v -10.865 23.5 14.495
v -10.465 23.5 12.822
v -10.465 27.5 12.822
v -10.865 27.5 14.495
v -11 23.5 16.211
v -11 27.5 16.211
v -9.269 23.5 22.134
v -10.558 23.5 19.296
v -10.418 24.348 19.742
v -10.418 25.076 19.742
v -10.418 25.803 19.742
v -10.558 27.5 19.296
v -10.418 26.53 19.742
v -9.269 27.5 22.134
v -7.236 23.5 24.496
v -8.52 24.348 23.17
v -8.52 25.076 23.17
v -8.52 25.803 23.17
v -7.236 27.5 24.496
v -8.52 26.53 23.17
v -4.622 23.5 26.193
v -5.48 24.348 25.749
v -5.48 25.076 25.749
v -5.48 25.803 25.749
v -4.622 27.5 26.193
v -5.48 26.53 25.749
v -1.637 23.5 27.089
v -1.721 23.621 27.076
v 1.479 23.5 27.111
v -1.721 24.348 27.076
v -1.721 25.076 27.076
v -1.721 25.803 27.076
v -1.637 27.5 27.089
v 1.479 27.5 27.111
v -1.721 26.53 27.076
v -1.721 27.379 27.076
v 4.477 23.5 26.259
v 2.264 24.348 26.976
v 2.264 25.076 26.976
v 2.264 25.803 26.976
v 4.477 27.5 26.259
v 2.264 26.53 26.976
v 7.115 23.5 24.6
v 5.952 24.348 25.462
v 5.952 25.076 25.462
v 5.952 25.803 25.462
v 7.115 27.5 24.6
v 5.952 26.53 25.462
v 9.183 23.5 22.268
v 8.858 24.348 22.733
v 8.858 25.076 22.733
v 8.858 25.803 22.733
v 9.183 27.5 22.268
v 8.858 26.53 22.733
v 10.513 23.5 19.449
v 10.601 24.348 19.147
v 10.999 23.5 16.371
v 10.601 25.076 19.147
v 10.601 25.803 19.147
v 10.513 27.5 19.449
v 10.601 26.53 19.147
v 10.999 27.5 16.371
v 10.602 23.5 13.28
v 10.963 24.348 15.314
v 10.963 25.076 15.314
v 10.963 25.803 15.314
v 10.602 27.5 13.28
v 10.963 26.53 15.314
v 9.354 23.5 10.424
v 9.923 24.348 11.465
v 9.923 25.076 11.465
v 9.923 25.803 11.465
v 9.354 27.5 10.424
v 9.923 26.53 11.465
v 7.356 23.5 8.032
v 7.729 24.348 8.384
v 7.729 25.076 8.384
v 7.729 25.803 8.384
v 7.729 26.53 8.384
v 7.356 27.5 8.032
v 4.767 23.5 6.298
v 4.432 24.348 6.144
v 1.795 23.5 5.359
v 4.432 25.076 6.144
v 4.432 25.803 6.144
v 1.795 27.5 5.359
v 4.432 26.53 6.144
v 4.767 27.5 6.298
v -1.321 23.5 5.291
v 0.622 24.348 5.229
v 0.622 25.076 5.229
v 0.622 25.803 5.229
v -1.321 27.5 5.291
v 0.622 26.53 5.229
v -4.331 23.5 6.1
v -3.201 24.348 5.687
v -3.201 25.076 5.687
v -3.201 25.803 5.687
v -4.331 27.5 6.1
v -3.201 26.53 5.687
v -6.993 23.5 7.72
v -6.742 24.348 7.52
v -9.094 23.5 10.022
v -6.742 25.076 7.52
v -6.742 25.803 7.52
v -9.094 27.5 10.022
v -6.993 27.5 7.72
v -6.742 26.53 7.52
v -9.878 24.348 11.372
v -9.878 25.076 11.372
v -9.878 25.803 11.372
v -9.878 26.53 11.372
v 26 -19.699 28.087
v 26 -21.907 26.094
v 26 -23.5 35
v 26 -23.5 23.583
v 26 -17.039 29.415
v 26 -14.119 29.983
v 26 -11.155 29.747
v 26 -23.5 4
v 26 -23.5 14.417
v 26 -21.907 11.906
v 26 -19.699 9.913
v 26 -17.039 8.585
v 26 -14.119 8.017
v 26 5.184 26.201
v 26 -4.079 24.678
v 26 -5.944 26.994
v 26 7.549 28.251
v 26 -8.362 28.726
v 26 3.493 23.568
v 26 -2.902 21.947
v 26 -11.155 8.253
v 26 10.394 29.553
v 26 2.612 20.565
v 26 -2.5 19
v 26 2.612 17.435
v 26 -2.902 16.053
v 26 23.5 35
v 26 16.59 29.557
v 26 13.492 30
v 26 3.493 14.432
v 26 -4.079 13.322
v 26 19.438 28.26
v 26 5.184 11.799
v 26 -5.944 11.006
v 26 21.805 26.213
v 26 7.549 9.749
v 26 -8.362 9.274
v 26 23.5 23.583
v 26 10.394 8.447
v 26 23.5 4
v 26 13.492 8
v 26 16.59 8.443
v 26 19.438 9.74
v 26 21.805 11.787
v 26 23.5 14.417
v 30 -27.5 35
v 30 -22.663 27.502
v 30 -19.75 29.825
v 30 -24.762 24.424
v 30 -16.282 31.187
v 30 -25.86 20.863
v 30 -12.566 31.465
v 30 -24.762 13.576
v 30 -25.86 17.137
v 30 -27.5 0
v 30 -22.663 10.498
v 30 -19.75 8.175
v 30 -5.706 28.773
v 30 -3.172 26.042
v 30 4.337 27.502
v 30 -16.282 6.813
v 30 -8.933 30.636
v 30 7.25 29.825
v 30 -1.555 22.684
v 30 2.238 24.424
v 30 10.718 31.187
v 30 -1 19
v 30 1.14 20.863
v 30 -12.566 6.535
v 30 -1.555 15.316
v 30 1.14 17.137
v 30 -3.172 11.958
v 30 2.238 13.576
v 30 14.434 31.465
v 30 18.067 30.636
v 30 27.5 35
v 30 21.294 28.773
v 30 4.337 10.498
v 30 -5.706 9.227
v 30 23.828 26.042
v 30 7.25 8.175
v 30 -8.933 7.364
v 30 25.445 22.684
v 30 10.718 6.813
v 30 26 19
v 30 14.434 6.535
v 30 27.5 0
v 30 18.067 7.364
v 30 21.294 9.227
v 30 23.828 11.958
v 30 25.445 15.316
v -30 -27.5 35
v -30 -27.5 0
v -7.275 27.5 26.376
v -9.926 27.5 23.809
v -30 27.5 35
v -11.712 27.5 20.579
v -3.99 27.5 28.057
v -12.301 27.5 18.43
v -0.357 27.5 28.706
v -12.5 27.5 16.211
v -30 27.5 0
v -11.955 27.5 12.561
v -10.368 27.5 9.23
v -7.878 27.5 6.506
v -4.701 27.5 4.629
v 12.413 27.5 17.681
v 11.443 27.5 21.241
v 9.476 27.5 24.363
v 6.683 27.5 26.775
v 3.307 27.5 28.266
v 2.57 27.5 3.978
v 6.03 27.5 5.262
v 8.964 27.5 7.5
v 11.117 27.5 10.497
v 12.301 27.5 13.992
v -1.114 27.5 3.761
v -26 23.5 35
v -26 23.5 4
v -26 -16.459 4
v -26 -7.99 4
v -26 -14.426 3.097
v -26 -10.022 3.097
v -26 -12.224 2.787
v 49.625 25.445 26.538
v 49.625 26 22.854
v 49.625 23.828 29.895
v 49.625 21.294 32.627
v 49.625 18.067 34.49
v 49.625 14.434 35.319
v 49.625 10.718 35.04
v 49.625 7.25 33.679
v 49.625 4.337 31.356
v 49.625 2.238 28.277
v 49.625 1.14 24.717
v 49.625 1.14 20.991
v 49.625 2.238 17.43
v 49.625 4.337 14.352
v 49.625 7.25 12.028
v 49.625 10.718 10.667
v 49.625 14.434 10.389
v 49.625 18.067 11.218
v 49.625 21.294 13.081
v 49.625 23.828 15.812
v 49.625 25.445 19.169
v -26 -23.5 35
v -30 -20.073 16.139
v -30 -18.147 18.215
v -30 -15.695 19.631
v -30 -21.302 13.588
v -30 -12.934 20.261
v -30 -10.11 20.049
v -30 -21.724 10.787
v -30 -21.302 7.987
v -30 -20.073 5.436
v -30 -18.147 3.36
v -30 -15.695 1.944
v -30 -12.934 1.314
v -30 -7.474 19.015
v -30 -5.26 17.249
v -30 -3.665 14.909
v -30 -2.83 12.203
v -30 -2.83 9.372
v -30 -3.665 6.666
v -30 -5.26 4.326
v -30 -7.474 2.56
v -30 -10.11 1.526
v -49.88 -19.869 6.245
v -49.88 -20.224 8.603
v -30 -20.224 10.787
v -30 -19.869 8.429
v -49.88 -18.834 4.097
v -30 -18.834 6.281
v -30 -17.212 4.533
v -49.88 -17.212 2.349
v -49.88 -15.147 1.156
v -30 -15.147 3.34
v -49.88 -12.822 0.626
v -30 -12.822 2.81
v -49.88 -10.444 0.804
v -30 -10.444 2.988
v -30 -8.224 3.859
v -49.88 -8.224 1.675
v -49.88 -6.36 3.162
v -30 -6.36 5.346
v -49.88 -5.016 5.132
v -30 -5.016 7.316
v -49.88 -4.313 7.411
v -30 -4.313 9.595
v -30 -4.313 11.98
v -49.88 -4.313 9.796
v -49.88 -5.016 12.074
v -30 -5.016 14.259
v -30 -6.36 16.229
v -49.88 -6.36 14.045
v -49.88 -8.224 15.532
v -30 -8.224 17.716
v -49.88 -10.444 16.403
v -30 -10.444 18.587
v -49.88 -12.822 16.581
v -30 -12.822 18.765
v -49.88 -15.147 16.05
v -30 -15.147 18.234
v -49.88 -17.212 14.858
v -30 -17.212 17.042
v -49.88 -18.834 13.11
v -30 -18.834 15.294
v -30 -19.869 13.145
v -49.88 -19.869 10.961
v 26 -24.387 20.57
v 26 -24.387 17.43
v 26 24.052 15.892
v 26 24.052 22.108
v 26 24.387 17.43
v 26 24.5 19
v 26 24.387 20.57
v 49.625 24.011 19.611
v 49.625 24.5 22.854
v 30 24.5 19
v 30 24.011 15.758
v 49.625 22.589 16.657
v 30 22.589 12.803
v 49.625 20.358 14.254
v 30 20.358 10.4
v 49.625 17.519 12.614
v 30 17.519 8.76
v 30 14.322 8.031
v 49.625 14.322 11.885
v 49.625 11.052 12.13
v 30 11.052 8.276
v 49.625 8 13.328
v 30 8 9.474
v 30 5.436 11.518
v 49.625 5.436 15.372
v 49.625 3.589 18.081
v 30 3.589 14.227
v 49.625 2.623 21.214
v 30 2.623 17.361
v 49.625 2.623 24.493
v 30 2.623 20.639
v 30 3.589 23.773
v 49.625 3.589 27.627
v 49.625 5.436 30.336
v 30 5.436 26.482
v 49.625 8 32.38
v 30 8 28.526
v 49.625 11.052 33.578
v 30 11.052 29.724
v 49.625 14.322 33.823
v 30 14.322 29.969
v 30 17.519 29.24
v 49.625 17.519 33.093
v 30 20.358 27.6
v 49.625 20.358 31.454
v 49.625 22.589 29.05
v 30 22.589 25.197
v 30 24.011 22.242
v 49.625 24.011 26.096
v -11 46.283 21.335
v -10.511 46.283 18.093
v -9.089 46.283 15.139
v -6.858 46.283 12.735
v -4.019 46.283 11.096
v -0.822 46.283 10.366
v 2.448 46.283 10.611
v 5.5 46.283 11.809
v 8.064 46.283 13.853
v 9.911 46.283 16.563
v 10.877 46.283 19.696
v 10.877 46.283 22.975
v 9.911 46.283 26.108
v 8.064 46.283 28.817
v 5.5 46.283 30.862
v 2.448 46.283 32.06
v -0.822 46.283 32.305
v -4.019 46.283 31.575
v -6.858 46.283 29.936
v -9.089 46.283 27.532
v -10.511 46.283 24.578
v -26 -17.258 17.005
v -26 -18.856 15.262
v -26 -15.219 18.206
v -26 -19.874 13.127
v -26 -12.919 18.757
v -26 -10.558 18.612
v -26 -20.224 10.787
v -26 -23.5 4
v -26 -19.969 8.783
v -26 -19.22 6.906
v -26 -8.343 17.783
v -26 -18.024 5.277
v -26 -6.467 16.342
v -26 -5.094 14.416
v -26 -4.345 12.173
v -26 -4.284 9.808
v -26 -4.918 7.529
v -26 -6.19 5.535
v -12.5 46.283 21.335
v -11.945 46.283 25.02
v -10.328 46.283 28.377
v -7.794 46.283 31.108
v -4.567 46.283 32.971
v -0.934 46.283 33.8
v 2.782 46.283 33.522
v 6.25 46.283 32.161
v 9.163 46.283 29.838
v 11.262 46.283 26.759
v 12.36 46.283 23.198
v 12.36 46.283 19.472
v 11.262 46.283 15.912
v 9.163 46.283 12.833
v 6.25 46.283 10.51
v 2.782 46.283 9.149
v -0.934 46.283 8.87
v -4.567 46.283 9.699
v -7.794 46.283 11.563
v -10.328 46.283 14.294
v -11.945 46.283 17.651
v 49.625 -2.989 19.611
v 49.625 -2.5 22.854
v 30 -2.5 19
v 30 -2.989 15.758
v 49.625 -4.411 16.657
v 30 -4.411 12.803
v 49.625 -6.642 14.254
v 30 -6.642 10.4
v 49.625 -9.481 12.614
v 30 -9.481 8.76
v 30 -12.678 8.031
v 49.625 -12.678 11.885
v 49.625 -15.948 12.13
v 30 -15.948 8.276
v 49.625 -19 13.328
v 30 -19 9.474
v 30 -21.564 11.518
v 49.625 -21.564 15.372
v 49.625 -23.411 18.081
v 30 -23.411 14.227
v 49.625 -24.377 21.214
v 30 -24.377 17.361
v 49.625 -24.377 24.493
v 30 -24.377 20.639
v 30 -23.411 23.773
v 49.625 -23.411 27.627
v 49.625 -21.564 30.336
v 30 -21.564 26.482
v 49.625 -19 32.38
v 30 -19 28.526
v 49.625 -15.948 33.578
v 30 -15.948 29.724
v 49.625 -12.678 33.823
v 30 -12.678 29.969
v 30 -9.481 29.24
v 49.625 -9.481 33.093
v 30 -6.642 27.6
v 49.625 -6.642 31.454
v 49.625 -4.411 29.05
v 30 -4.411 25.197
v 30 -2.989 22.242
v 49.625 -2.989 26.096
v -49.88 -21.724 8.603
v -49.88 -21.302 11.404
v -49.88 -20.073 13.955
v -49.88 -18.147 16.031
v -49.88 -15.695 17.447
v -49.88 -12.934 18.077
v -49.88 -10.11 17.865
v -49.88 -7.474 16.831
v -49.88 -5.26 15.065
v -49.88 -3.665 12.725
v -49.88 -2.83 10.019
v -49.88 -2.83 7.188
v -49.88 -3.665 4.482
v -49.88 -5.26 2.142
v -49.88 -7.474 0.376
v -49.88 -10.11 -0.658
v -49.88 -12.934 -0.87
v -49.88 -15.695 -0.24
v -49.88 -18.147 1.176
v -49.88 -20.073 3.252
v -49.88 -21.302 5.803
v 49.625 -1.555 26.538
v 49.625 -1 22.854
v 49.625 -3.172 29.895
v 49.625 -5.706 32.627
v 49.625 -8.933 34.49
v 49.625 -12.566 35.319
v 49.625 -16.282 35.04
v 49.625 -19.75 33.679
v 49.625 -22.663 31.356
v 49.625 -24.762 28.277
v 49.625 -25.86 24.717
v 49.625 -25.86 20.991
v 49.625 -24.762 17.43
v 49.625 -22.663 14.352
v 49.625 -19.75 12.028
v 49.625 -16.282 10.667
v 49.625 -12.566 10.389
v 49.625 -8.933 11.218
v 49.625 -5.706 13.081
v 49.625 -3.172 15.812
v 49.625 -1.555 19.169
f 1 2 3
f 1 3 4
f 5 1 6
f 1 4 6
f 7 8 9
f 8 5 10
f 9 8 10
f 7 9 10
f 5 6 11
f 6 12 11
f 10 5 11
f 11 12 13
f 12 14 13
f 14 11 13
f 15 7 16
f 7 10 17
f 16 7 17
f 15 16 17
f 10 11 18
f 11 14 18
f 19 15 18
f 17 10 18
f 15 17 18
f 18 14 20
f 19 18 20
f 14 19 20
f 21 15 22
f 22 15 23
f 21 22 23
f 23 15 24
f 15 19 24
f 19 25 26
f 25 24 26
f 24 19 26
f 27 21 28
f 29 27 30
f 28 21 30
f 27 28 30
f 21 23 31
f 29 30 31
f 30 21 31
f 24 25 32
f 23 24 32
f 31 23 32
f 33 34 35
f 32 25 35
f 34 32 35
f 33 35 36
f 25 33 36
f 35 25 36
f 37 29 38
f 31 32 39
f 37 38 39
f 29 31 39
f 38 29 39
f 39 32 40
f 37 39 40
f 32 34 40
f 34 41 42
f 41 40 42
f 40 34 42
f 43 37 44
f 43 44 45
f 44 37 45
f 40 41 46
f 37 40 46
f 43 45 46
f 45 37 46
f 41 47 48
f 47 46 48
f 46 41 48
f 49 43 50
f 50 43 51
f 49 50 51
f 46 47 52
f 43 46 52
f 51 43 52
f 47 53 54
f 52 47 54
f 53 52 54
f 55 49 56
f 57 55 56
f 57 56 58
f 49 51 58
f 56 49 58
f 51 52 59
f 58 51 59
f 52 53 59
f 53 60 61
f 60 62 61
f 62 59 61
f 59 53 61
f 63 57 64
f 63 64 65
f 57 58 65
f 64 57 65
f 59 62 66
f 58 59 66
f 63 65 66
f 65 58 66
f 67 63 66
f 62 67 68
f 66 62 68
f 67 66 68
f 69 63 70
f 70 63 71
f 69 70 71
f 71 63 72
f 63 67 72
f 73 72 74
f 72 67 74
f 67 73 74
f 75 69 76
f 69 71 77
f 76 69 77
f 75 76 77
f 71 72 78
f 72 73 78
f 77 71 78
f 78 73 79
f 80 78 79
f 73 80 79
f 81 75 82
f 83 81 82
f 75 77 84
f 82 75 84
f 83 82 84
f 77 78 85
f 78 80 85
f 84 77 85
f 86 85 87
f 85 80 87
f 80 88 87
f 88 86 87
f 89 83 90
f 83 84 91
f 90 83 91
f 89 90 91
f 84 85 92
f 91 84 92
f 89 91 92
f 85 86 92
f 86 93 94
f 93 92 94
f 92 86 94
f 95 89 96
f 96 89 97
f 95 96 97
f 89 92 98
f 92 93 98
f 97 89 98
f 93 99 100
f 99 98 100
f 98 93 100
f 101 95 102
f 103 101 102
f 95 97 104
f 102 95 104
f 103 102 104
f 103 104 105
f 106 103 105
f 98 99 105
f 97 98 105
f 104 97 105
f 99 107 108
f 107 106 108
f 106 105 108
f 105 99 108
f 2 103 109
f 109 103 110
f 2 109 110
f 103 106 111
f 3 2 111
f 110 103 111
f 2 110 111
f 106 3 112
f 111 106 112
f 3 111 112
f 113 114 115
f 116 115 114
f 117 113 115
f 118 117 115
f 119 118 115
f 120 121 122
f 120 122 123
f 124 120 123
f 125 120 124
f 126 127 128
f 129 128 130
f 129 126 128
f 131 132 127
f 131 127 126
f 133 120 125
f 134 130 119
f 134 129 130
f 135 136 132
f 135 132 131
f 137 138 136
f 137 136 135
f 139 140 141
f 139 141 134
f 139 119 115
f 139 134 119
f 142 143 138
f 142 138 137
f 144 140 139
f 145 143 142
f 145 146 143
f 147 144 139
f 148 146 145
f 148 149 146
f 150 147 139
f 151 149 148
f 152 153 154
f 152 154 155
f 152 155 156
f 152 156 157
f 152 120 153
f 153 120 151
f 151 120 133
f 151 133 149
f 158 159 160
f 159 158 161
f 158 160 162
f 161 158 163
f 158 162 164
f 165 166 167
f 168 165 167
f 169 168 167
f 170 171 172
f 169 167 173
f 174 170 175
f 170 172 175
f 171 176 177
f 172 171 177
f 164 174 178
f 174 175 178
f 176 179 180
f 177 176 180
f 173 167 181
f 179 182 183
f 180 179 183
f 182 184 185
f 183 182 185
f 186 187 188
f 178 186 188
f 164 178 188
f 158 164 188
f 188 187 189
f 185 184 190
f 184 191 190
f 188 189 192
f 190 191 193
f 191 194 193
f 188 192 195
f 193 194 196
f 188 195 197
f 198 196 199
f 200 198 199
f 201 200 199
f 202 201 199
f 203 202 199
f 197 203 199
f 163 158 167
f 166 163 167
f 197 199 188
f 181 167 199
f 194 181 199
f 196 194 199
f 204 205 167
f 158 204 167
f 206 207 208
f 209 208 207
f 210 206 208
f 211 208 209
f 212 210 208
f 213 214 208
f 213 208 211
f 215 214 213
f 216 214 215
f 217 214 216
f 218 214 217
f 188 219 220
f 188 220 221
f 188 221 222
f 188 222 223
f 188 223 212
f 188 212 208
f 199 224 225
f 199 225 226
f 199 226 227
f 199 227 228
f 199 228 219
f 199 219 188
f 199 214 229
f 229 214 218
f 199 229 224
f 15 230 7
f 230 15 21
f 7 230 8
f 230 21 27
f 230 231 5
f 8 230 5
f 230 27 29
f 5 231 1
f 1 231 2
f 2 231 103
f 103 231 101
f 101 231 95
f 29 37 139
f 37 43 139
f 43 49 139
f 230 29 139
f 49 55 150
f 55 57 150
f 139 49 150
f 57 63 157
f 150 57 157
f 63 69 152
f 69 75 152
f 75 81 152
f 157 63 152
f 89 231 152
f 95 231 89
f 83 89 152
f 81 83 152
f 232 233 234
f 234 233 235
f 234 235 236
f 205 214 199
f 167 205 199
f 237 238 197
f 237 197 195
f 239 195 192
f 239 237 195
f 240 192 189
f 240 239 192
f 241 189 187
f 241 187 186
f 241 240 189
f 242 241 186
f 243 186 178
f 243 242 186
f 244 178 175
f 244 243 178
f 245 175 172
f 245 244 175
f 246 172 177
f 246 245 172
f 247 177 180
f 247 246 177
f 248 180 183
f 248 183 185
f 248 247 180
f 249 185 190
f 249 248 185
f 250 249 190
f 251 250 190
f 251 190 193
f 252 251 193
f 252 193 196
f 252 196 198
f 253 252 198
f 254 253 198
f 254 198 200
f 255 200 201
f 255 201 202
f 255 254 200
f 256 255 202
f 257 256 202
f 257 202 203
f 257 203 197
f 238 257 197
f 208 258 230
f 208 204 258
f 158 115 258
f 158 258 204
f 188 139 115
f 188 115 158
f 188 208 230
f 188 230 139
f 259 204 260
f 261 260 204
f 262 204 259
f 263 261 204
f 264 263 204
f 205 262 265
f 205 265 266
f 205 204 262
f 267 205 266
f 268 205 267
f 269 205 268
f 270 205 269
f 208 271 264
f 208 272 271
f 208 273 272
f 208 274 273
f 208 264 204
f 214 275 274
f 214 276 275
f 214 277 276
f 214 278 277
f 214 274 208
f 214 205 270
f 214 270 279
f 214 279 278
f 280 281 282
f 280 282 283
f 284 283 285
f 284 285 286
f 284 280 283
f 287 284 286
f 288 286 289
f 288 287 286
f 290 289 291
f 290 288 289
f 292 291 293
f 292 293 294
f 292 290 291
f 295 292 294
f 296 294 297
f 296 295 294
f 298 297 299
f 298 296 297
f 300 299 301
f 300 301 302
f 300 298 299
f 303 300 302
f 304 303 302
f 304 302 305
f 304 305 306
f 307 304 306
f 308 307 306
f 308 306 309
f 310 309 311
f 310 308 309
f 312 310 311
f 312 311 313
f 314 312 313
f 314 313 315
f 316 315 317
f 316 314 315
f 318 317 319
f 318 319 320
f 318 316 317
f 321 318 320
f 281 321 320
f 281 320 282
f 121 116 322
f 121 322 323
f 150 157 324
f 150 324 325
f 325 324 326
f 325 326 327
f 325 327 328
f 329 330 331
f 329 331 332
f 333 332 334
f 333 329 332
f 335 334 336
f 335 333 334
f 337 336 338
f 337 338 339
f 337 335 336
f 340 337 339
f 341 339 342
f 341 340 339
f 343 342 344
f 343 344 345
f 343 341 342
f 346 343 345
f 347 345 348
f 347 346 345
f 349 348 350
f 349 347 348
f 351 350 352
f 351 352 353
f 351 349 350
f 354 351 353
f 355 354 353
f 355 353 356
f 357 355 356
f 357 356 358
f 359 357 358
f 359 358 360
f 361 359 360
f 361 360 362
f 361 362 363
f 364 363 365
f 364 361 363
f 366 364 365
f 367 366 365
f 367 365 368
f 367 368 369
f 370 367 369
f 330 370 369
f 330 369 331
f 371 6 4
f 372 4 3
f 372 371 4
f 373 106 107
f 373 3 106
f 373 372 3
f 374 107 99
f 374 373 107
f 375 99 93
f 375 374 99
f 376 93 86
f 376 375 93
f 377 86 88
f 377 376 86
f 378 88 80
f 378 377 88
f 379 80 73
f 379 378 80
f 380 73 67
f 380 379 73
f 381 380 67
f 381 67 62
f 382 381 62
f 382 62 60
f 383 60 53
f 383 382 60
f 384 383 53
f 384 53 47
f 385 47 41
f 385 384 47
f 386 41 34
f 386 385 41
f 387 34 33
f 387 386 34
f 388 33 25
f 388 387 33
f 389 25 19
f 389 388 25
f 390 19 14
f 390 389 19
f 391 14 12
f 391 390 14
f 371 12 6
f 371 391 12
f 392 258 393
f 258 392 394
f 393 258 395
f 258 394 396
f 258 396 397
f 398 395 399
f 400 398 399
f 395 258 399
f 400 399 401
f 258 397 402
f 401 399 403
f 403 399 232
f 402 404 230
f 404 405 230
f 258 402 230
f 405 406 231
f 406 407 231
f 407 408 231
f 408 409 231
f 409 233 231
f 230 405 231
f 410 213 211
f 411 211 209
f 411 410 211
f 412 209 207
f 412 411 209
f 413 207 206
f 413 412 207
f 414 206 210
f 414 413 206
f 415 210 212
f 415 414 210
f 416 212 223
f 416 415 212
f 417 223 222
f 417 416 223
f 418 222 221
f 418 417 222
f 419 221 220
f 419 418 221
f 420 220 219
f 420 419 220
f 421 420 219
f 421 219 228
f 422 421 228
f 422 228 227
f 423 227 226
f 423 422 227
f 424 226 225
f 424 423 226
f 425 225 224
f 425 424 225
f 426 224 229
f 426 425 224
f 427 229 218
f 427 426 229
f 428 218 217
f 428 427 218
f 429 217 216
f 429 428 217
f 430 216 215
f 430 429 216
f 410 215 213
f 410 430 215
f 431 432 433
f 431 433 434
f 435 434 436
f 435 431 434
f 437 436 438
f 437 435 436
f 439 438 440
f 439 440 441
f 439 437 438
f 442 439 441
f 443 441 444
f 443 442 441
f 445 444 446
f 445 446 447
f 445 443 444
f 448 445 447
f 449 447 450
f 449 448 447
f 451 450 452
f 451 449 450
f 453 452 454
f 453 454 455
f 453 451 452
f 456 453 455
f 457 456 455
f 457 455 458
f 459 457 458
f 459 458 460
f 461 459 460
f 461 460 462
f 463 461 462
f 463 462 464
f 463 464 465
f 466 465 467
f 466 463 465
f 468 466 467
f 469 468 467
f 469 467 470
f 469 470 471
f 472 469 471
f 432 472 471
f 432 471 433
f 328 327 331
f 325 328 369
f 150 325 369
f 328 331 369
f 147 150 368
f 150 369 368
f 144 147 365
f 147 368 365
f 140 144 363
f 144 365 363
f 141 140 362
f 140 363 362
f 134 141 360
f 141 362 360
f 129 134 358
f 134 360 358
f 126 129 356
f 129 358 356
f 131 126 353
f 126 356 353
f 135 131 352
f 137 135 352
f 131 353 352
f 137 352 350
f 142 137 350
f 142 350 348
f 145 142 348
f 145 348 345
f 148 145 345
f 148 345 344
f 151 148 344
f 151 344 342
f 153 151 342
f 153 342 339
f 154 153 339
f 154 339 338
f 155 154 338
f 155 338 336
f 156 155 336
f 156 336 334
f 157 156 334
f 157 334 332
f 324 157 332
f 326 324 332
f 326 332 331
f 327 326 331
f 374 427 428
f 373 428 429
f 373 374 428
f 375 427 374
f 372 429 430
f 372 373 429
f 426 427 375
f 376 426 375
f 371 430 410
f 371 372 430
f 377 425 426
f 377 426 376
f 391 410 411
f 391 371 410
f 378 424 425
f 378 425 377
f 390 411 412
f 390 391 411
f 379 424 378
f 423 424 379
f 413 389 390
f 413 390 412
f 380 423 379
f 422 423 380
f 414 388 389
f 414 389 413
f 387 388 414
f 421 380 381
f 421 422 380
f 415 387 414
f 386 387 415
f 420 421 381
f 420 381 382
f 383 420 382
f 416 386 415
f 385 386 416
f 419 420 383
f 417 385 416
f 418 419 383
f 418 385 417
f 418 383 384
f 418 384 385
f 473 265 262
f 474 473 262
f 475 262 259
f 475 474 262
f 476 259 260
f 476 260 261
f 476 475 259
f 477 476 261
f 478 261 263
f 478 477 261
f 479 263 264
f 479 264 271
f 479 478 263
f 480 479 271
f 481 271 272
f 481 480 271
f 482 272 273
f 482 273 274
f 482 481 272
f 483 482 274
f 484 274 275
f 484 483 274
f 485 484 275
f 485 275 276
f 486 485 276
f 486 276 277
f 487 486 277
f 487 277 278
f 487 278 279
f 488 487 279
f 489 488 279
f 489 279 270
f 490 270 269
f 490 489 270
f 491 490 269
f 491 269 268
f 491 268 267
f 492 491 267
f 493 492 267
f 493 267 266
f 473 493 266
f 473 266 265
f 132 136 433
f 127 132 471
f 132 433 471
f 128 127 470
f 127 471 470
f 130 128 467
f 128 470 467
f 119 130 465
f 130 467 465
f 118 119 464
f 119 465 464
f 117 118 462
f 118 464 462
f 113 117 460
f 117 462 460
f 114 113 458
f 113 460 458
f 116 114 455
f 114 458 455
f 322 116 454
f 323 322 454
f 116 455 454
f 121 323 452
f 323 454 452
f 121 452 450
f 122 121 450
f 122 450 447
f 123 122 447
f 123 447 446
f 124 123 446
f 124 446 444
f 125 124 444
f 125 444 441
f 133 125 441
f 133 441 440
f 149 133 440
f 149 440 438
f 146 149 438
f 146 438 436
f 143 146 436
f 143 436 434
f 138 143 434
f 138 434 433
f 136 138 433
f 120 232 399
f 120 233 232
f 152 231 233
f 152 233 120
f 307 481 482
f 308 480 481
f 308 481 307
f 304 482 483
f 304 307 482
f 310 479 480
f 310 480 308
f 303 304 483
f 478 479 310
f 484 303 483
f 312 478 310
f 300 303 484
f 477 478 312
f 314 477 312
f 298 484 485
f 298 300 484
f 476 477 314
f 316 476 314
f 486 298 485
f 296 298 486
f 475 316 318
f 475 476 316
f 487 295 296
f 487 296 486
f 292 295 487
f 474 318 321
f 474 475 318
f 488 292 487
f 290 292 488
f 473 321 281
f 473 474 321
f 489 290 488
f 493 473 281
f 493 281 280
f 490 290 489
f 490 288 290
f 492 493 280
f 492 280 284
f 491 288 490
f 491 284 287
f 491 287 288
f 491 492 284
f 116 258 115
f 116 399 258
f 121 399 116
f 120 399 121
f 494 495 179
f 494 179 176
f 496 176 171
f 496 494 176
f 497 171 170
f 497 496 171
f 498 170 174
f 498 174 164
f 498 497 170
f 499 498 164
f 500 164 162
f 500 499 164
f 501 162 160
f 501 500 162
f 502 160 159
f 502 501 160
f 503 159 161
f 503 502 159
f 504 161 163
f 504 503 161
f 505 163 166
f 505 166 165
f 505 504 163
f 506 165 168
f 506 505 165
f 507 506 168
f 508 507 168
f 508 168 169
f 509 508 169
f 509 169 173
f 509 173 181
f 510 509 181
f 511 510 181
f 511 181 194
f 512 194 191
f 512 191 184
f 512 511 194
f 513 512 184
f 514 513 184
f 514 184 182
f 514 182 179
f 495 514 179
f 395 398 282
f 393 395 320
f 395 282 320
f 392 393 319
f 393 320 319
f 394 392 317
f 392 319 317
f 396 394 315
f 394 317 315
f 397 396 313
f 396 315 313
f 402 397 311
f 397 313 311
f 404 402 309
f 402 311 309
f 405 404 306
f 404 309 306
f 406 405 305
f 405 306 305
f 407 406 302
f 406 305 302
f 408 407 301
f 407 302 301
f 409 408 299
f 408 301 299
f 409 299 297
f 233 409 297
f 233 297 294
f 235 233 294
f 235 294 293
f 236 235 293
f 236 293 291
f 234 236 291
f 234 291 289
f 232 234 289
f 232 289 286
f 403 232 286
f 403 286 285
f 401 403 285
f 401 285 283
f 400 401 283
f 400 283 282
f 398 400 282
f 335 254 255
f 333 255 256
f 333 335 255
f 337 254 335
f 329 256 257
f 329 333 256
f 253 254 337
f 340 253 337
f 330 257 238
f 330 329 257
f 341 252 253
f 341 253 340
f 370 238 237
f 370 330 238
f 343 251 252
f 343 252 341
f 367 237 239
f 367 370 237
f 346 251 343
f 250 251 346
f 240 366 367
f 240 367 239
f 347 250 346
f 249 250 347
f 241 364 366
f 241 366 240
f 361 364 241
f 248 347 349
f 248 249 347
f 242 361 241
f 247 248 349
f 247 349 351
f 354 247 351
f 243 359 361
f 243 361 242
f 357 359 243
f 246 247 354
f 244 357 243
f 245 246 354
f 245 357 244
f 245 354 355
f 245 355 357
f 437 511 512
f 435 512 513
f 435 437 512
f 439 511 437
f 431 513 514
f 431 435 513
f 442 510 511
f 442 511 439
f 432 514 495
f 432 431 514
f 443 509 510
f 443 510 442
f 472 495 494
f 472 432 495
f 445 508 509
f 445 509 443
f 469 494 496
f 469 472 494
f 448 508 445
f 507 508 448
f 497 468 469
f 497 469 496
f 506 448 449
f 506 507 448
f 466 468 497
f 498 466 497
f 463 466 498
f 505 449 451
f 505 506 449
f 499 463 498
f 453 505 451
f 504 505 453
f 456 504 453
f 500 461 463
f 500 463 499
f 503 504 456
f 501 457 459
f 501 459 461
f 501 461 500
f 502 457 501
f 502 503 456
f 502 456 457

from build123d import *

# Parameters (mm, degrees)
F0_W      = 60
F0_H      = 55
F1_DEPTH  = 35
F2_T      = -4
F3_R      = 9.5
F3_R_2    = 8
F6_R      = 8
F7_DEPTH  = 4
F8_R      = 12.5
F8_R_2    = 11
F11_R     = 11
F12_DEPTH = 4
F13_R     = 12.5
F13_R_2   = 11
F16_DEPTH = 4


with BuildPart() as f1:
    # F0 (on Top) → F1 (new body)
    with BuildSketch(Plane.XY):
        Rectangle(F0_W, F0_H)
    extrude(amount=F1_DEPTH)

    # F2
    f2_openings = [f1.faces().sort_by_distance(p)[0] for p in [
        (0, 0, 35),
    ]]
    offset(amount=F2_T, openings=f2_openings)

    # F5: sweep along a path in F4
    with BuildLine(Plane.XZ) as f5_path:
        Line((-30, 12.8732416779), (-49.8803923108, 10.6892083519))
    # F3 (on face) → F5 (sweep)
    with BuildSketch(Plane(origin=(-30, 0, 0), x_dir=(0, -1, 0), z_dir=(-1, 0, 0))):
        with Locations((12.2240986817, 10.7874526048)):
            Circle(F3_R)
        with Locations((12.2240986817, 10.7874526048)):
            Circle(F3_R_2, mode=Mode.SUBTRACT)
    sweep(path=f5_path.line)

    # F6 (on face) → F7 (cut, through all)
    with BuildSketch(Plane(origin=(-30, 0, 0), x_dir=(0, -1, 0), z_dir=(-1, 0, 0))):
        with Locations((12.2240986817, 10.7874526048)):
            Circle(F6_R)
    extrude(amount=-F7_DEPTH, mode=Mode.SUBTRACT)

    # F10: sweep along a path in F9
    with BuildLine(Plane.XZ) as f10_path:
        Line((34.9448250159, 21.2307306323), (54.5700194764, 25.0845264738))
    # F8 (on face) → F10 (sweep)
    with BuildSketch(Plane.YZ.offset(30)):
        with Locations((-13.5, 19)):
            Circle(F8_R)
        with Locations((-13.5, 19)):
            Circle(F8_R_2, mode=Mode.SUBTRACT)
        with Locations((13.5, 19)):
            Circle(F8_R)
        with Locations((13.5, 19)):
            Circle(F8_R_2, mode=Mode.SUBTRACT)
    sweep(path=f10_path.line)

    # F11 (on face) → F12 (cut, through all)
    with BuildSketch(Plane.YZ.offset(30)):
        with Locations((13.5, 19)):
            Circle(F11_R)
        with Locations((-13.5, 19)):
            Circle(F11_R)
    extrude(amount=-F12_DEPTH, mode=Mode.SUBTRACT)

    # F15: sweep along a path in F14
    with BuildLine(Plane.YZ) as f15_path:
        Line((26.9883851239, 16.3239016038), (46.2833066753, 21.5875507492))
    # F13 (on face) → F15 (sweep)
    with BuildSketch(Plane(origin=(0, 27.5, 0), x_dir=(-1, 0, 0), z_dir=(0, 1, 0))):
        with Locations((0, 16.2113178521)):
            Circle(F13_R)
        with Locations((0, 16.2113178521)):
            Circle(F13_R_2, mode=Mode.SUBTRACT)
    sweep(path=f15_path.line)

    # F16 (cut, through all): a face of the model
    f16_faces = [f1.faces().sort_by_distance(p)[0] for p in [
        (5.559e-07, 27.5, 16.2113144868),
    ]]
    extrude(f16_faces, amount=-F16_DEPTH, mode=Mode.SUBTRACT)


solid = f1.part
